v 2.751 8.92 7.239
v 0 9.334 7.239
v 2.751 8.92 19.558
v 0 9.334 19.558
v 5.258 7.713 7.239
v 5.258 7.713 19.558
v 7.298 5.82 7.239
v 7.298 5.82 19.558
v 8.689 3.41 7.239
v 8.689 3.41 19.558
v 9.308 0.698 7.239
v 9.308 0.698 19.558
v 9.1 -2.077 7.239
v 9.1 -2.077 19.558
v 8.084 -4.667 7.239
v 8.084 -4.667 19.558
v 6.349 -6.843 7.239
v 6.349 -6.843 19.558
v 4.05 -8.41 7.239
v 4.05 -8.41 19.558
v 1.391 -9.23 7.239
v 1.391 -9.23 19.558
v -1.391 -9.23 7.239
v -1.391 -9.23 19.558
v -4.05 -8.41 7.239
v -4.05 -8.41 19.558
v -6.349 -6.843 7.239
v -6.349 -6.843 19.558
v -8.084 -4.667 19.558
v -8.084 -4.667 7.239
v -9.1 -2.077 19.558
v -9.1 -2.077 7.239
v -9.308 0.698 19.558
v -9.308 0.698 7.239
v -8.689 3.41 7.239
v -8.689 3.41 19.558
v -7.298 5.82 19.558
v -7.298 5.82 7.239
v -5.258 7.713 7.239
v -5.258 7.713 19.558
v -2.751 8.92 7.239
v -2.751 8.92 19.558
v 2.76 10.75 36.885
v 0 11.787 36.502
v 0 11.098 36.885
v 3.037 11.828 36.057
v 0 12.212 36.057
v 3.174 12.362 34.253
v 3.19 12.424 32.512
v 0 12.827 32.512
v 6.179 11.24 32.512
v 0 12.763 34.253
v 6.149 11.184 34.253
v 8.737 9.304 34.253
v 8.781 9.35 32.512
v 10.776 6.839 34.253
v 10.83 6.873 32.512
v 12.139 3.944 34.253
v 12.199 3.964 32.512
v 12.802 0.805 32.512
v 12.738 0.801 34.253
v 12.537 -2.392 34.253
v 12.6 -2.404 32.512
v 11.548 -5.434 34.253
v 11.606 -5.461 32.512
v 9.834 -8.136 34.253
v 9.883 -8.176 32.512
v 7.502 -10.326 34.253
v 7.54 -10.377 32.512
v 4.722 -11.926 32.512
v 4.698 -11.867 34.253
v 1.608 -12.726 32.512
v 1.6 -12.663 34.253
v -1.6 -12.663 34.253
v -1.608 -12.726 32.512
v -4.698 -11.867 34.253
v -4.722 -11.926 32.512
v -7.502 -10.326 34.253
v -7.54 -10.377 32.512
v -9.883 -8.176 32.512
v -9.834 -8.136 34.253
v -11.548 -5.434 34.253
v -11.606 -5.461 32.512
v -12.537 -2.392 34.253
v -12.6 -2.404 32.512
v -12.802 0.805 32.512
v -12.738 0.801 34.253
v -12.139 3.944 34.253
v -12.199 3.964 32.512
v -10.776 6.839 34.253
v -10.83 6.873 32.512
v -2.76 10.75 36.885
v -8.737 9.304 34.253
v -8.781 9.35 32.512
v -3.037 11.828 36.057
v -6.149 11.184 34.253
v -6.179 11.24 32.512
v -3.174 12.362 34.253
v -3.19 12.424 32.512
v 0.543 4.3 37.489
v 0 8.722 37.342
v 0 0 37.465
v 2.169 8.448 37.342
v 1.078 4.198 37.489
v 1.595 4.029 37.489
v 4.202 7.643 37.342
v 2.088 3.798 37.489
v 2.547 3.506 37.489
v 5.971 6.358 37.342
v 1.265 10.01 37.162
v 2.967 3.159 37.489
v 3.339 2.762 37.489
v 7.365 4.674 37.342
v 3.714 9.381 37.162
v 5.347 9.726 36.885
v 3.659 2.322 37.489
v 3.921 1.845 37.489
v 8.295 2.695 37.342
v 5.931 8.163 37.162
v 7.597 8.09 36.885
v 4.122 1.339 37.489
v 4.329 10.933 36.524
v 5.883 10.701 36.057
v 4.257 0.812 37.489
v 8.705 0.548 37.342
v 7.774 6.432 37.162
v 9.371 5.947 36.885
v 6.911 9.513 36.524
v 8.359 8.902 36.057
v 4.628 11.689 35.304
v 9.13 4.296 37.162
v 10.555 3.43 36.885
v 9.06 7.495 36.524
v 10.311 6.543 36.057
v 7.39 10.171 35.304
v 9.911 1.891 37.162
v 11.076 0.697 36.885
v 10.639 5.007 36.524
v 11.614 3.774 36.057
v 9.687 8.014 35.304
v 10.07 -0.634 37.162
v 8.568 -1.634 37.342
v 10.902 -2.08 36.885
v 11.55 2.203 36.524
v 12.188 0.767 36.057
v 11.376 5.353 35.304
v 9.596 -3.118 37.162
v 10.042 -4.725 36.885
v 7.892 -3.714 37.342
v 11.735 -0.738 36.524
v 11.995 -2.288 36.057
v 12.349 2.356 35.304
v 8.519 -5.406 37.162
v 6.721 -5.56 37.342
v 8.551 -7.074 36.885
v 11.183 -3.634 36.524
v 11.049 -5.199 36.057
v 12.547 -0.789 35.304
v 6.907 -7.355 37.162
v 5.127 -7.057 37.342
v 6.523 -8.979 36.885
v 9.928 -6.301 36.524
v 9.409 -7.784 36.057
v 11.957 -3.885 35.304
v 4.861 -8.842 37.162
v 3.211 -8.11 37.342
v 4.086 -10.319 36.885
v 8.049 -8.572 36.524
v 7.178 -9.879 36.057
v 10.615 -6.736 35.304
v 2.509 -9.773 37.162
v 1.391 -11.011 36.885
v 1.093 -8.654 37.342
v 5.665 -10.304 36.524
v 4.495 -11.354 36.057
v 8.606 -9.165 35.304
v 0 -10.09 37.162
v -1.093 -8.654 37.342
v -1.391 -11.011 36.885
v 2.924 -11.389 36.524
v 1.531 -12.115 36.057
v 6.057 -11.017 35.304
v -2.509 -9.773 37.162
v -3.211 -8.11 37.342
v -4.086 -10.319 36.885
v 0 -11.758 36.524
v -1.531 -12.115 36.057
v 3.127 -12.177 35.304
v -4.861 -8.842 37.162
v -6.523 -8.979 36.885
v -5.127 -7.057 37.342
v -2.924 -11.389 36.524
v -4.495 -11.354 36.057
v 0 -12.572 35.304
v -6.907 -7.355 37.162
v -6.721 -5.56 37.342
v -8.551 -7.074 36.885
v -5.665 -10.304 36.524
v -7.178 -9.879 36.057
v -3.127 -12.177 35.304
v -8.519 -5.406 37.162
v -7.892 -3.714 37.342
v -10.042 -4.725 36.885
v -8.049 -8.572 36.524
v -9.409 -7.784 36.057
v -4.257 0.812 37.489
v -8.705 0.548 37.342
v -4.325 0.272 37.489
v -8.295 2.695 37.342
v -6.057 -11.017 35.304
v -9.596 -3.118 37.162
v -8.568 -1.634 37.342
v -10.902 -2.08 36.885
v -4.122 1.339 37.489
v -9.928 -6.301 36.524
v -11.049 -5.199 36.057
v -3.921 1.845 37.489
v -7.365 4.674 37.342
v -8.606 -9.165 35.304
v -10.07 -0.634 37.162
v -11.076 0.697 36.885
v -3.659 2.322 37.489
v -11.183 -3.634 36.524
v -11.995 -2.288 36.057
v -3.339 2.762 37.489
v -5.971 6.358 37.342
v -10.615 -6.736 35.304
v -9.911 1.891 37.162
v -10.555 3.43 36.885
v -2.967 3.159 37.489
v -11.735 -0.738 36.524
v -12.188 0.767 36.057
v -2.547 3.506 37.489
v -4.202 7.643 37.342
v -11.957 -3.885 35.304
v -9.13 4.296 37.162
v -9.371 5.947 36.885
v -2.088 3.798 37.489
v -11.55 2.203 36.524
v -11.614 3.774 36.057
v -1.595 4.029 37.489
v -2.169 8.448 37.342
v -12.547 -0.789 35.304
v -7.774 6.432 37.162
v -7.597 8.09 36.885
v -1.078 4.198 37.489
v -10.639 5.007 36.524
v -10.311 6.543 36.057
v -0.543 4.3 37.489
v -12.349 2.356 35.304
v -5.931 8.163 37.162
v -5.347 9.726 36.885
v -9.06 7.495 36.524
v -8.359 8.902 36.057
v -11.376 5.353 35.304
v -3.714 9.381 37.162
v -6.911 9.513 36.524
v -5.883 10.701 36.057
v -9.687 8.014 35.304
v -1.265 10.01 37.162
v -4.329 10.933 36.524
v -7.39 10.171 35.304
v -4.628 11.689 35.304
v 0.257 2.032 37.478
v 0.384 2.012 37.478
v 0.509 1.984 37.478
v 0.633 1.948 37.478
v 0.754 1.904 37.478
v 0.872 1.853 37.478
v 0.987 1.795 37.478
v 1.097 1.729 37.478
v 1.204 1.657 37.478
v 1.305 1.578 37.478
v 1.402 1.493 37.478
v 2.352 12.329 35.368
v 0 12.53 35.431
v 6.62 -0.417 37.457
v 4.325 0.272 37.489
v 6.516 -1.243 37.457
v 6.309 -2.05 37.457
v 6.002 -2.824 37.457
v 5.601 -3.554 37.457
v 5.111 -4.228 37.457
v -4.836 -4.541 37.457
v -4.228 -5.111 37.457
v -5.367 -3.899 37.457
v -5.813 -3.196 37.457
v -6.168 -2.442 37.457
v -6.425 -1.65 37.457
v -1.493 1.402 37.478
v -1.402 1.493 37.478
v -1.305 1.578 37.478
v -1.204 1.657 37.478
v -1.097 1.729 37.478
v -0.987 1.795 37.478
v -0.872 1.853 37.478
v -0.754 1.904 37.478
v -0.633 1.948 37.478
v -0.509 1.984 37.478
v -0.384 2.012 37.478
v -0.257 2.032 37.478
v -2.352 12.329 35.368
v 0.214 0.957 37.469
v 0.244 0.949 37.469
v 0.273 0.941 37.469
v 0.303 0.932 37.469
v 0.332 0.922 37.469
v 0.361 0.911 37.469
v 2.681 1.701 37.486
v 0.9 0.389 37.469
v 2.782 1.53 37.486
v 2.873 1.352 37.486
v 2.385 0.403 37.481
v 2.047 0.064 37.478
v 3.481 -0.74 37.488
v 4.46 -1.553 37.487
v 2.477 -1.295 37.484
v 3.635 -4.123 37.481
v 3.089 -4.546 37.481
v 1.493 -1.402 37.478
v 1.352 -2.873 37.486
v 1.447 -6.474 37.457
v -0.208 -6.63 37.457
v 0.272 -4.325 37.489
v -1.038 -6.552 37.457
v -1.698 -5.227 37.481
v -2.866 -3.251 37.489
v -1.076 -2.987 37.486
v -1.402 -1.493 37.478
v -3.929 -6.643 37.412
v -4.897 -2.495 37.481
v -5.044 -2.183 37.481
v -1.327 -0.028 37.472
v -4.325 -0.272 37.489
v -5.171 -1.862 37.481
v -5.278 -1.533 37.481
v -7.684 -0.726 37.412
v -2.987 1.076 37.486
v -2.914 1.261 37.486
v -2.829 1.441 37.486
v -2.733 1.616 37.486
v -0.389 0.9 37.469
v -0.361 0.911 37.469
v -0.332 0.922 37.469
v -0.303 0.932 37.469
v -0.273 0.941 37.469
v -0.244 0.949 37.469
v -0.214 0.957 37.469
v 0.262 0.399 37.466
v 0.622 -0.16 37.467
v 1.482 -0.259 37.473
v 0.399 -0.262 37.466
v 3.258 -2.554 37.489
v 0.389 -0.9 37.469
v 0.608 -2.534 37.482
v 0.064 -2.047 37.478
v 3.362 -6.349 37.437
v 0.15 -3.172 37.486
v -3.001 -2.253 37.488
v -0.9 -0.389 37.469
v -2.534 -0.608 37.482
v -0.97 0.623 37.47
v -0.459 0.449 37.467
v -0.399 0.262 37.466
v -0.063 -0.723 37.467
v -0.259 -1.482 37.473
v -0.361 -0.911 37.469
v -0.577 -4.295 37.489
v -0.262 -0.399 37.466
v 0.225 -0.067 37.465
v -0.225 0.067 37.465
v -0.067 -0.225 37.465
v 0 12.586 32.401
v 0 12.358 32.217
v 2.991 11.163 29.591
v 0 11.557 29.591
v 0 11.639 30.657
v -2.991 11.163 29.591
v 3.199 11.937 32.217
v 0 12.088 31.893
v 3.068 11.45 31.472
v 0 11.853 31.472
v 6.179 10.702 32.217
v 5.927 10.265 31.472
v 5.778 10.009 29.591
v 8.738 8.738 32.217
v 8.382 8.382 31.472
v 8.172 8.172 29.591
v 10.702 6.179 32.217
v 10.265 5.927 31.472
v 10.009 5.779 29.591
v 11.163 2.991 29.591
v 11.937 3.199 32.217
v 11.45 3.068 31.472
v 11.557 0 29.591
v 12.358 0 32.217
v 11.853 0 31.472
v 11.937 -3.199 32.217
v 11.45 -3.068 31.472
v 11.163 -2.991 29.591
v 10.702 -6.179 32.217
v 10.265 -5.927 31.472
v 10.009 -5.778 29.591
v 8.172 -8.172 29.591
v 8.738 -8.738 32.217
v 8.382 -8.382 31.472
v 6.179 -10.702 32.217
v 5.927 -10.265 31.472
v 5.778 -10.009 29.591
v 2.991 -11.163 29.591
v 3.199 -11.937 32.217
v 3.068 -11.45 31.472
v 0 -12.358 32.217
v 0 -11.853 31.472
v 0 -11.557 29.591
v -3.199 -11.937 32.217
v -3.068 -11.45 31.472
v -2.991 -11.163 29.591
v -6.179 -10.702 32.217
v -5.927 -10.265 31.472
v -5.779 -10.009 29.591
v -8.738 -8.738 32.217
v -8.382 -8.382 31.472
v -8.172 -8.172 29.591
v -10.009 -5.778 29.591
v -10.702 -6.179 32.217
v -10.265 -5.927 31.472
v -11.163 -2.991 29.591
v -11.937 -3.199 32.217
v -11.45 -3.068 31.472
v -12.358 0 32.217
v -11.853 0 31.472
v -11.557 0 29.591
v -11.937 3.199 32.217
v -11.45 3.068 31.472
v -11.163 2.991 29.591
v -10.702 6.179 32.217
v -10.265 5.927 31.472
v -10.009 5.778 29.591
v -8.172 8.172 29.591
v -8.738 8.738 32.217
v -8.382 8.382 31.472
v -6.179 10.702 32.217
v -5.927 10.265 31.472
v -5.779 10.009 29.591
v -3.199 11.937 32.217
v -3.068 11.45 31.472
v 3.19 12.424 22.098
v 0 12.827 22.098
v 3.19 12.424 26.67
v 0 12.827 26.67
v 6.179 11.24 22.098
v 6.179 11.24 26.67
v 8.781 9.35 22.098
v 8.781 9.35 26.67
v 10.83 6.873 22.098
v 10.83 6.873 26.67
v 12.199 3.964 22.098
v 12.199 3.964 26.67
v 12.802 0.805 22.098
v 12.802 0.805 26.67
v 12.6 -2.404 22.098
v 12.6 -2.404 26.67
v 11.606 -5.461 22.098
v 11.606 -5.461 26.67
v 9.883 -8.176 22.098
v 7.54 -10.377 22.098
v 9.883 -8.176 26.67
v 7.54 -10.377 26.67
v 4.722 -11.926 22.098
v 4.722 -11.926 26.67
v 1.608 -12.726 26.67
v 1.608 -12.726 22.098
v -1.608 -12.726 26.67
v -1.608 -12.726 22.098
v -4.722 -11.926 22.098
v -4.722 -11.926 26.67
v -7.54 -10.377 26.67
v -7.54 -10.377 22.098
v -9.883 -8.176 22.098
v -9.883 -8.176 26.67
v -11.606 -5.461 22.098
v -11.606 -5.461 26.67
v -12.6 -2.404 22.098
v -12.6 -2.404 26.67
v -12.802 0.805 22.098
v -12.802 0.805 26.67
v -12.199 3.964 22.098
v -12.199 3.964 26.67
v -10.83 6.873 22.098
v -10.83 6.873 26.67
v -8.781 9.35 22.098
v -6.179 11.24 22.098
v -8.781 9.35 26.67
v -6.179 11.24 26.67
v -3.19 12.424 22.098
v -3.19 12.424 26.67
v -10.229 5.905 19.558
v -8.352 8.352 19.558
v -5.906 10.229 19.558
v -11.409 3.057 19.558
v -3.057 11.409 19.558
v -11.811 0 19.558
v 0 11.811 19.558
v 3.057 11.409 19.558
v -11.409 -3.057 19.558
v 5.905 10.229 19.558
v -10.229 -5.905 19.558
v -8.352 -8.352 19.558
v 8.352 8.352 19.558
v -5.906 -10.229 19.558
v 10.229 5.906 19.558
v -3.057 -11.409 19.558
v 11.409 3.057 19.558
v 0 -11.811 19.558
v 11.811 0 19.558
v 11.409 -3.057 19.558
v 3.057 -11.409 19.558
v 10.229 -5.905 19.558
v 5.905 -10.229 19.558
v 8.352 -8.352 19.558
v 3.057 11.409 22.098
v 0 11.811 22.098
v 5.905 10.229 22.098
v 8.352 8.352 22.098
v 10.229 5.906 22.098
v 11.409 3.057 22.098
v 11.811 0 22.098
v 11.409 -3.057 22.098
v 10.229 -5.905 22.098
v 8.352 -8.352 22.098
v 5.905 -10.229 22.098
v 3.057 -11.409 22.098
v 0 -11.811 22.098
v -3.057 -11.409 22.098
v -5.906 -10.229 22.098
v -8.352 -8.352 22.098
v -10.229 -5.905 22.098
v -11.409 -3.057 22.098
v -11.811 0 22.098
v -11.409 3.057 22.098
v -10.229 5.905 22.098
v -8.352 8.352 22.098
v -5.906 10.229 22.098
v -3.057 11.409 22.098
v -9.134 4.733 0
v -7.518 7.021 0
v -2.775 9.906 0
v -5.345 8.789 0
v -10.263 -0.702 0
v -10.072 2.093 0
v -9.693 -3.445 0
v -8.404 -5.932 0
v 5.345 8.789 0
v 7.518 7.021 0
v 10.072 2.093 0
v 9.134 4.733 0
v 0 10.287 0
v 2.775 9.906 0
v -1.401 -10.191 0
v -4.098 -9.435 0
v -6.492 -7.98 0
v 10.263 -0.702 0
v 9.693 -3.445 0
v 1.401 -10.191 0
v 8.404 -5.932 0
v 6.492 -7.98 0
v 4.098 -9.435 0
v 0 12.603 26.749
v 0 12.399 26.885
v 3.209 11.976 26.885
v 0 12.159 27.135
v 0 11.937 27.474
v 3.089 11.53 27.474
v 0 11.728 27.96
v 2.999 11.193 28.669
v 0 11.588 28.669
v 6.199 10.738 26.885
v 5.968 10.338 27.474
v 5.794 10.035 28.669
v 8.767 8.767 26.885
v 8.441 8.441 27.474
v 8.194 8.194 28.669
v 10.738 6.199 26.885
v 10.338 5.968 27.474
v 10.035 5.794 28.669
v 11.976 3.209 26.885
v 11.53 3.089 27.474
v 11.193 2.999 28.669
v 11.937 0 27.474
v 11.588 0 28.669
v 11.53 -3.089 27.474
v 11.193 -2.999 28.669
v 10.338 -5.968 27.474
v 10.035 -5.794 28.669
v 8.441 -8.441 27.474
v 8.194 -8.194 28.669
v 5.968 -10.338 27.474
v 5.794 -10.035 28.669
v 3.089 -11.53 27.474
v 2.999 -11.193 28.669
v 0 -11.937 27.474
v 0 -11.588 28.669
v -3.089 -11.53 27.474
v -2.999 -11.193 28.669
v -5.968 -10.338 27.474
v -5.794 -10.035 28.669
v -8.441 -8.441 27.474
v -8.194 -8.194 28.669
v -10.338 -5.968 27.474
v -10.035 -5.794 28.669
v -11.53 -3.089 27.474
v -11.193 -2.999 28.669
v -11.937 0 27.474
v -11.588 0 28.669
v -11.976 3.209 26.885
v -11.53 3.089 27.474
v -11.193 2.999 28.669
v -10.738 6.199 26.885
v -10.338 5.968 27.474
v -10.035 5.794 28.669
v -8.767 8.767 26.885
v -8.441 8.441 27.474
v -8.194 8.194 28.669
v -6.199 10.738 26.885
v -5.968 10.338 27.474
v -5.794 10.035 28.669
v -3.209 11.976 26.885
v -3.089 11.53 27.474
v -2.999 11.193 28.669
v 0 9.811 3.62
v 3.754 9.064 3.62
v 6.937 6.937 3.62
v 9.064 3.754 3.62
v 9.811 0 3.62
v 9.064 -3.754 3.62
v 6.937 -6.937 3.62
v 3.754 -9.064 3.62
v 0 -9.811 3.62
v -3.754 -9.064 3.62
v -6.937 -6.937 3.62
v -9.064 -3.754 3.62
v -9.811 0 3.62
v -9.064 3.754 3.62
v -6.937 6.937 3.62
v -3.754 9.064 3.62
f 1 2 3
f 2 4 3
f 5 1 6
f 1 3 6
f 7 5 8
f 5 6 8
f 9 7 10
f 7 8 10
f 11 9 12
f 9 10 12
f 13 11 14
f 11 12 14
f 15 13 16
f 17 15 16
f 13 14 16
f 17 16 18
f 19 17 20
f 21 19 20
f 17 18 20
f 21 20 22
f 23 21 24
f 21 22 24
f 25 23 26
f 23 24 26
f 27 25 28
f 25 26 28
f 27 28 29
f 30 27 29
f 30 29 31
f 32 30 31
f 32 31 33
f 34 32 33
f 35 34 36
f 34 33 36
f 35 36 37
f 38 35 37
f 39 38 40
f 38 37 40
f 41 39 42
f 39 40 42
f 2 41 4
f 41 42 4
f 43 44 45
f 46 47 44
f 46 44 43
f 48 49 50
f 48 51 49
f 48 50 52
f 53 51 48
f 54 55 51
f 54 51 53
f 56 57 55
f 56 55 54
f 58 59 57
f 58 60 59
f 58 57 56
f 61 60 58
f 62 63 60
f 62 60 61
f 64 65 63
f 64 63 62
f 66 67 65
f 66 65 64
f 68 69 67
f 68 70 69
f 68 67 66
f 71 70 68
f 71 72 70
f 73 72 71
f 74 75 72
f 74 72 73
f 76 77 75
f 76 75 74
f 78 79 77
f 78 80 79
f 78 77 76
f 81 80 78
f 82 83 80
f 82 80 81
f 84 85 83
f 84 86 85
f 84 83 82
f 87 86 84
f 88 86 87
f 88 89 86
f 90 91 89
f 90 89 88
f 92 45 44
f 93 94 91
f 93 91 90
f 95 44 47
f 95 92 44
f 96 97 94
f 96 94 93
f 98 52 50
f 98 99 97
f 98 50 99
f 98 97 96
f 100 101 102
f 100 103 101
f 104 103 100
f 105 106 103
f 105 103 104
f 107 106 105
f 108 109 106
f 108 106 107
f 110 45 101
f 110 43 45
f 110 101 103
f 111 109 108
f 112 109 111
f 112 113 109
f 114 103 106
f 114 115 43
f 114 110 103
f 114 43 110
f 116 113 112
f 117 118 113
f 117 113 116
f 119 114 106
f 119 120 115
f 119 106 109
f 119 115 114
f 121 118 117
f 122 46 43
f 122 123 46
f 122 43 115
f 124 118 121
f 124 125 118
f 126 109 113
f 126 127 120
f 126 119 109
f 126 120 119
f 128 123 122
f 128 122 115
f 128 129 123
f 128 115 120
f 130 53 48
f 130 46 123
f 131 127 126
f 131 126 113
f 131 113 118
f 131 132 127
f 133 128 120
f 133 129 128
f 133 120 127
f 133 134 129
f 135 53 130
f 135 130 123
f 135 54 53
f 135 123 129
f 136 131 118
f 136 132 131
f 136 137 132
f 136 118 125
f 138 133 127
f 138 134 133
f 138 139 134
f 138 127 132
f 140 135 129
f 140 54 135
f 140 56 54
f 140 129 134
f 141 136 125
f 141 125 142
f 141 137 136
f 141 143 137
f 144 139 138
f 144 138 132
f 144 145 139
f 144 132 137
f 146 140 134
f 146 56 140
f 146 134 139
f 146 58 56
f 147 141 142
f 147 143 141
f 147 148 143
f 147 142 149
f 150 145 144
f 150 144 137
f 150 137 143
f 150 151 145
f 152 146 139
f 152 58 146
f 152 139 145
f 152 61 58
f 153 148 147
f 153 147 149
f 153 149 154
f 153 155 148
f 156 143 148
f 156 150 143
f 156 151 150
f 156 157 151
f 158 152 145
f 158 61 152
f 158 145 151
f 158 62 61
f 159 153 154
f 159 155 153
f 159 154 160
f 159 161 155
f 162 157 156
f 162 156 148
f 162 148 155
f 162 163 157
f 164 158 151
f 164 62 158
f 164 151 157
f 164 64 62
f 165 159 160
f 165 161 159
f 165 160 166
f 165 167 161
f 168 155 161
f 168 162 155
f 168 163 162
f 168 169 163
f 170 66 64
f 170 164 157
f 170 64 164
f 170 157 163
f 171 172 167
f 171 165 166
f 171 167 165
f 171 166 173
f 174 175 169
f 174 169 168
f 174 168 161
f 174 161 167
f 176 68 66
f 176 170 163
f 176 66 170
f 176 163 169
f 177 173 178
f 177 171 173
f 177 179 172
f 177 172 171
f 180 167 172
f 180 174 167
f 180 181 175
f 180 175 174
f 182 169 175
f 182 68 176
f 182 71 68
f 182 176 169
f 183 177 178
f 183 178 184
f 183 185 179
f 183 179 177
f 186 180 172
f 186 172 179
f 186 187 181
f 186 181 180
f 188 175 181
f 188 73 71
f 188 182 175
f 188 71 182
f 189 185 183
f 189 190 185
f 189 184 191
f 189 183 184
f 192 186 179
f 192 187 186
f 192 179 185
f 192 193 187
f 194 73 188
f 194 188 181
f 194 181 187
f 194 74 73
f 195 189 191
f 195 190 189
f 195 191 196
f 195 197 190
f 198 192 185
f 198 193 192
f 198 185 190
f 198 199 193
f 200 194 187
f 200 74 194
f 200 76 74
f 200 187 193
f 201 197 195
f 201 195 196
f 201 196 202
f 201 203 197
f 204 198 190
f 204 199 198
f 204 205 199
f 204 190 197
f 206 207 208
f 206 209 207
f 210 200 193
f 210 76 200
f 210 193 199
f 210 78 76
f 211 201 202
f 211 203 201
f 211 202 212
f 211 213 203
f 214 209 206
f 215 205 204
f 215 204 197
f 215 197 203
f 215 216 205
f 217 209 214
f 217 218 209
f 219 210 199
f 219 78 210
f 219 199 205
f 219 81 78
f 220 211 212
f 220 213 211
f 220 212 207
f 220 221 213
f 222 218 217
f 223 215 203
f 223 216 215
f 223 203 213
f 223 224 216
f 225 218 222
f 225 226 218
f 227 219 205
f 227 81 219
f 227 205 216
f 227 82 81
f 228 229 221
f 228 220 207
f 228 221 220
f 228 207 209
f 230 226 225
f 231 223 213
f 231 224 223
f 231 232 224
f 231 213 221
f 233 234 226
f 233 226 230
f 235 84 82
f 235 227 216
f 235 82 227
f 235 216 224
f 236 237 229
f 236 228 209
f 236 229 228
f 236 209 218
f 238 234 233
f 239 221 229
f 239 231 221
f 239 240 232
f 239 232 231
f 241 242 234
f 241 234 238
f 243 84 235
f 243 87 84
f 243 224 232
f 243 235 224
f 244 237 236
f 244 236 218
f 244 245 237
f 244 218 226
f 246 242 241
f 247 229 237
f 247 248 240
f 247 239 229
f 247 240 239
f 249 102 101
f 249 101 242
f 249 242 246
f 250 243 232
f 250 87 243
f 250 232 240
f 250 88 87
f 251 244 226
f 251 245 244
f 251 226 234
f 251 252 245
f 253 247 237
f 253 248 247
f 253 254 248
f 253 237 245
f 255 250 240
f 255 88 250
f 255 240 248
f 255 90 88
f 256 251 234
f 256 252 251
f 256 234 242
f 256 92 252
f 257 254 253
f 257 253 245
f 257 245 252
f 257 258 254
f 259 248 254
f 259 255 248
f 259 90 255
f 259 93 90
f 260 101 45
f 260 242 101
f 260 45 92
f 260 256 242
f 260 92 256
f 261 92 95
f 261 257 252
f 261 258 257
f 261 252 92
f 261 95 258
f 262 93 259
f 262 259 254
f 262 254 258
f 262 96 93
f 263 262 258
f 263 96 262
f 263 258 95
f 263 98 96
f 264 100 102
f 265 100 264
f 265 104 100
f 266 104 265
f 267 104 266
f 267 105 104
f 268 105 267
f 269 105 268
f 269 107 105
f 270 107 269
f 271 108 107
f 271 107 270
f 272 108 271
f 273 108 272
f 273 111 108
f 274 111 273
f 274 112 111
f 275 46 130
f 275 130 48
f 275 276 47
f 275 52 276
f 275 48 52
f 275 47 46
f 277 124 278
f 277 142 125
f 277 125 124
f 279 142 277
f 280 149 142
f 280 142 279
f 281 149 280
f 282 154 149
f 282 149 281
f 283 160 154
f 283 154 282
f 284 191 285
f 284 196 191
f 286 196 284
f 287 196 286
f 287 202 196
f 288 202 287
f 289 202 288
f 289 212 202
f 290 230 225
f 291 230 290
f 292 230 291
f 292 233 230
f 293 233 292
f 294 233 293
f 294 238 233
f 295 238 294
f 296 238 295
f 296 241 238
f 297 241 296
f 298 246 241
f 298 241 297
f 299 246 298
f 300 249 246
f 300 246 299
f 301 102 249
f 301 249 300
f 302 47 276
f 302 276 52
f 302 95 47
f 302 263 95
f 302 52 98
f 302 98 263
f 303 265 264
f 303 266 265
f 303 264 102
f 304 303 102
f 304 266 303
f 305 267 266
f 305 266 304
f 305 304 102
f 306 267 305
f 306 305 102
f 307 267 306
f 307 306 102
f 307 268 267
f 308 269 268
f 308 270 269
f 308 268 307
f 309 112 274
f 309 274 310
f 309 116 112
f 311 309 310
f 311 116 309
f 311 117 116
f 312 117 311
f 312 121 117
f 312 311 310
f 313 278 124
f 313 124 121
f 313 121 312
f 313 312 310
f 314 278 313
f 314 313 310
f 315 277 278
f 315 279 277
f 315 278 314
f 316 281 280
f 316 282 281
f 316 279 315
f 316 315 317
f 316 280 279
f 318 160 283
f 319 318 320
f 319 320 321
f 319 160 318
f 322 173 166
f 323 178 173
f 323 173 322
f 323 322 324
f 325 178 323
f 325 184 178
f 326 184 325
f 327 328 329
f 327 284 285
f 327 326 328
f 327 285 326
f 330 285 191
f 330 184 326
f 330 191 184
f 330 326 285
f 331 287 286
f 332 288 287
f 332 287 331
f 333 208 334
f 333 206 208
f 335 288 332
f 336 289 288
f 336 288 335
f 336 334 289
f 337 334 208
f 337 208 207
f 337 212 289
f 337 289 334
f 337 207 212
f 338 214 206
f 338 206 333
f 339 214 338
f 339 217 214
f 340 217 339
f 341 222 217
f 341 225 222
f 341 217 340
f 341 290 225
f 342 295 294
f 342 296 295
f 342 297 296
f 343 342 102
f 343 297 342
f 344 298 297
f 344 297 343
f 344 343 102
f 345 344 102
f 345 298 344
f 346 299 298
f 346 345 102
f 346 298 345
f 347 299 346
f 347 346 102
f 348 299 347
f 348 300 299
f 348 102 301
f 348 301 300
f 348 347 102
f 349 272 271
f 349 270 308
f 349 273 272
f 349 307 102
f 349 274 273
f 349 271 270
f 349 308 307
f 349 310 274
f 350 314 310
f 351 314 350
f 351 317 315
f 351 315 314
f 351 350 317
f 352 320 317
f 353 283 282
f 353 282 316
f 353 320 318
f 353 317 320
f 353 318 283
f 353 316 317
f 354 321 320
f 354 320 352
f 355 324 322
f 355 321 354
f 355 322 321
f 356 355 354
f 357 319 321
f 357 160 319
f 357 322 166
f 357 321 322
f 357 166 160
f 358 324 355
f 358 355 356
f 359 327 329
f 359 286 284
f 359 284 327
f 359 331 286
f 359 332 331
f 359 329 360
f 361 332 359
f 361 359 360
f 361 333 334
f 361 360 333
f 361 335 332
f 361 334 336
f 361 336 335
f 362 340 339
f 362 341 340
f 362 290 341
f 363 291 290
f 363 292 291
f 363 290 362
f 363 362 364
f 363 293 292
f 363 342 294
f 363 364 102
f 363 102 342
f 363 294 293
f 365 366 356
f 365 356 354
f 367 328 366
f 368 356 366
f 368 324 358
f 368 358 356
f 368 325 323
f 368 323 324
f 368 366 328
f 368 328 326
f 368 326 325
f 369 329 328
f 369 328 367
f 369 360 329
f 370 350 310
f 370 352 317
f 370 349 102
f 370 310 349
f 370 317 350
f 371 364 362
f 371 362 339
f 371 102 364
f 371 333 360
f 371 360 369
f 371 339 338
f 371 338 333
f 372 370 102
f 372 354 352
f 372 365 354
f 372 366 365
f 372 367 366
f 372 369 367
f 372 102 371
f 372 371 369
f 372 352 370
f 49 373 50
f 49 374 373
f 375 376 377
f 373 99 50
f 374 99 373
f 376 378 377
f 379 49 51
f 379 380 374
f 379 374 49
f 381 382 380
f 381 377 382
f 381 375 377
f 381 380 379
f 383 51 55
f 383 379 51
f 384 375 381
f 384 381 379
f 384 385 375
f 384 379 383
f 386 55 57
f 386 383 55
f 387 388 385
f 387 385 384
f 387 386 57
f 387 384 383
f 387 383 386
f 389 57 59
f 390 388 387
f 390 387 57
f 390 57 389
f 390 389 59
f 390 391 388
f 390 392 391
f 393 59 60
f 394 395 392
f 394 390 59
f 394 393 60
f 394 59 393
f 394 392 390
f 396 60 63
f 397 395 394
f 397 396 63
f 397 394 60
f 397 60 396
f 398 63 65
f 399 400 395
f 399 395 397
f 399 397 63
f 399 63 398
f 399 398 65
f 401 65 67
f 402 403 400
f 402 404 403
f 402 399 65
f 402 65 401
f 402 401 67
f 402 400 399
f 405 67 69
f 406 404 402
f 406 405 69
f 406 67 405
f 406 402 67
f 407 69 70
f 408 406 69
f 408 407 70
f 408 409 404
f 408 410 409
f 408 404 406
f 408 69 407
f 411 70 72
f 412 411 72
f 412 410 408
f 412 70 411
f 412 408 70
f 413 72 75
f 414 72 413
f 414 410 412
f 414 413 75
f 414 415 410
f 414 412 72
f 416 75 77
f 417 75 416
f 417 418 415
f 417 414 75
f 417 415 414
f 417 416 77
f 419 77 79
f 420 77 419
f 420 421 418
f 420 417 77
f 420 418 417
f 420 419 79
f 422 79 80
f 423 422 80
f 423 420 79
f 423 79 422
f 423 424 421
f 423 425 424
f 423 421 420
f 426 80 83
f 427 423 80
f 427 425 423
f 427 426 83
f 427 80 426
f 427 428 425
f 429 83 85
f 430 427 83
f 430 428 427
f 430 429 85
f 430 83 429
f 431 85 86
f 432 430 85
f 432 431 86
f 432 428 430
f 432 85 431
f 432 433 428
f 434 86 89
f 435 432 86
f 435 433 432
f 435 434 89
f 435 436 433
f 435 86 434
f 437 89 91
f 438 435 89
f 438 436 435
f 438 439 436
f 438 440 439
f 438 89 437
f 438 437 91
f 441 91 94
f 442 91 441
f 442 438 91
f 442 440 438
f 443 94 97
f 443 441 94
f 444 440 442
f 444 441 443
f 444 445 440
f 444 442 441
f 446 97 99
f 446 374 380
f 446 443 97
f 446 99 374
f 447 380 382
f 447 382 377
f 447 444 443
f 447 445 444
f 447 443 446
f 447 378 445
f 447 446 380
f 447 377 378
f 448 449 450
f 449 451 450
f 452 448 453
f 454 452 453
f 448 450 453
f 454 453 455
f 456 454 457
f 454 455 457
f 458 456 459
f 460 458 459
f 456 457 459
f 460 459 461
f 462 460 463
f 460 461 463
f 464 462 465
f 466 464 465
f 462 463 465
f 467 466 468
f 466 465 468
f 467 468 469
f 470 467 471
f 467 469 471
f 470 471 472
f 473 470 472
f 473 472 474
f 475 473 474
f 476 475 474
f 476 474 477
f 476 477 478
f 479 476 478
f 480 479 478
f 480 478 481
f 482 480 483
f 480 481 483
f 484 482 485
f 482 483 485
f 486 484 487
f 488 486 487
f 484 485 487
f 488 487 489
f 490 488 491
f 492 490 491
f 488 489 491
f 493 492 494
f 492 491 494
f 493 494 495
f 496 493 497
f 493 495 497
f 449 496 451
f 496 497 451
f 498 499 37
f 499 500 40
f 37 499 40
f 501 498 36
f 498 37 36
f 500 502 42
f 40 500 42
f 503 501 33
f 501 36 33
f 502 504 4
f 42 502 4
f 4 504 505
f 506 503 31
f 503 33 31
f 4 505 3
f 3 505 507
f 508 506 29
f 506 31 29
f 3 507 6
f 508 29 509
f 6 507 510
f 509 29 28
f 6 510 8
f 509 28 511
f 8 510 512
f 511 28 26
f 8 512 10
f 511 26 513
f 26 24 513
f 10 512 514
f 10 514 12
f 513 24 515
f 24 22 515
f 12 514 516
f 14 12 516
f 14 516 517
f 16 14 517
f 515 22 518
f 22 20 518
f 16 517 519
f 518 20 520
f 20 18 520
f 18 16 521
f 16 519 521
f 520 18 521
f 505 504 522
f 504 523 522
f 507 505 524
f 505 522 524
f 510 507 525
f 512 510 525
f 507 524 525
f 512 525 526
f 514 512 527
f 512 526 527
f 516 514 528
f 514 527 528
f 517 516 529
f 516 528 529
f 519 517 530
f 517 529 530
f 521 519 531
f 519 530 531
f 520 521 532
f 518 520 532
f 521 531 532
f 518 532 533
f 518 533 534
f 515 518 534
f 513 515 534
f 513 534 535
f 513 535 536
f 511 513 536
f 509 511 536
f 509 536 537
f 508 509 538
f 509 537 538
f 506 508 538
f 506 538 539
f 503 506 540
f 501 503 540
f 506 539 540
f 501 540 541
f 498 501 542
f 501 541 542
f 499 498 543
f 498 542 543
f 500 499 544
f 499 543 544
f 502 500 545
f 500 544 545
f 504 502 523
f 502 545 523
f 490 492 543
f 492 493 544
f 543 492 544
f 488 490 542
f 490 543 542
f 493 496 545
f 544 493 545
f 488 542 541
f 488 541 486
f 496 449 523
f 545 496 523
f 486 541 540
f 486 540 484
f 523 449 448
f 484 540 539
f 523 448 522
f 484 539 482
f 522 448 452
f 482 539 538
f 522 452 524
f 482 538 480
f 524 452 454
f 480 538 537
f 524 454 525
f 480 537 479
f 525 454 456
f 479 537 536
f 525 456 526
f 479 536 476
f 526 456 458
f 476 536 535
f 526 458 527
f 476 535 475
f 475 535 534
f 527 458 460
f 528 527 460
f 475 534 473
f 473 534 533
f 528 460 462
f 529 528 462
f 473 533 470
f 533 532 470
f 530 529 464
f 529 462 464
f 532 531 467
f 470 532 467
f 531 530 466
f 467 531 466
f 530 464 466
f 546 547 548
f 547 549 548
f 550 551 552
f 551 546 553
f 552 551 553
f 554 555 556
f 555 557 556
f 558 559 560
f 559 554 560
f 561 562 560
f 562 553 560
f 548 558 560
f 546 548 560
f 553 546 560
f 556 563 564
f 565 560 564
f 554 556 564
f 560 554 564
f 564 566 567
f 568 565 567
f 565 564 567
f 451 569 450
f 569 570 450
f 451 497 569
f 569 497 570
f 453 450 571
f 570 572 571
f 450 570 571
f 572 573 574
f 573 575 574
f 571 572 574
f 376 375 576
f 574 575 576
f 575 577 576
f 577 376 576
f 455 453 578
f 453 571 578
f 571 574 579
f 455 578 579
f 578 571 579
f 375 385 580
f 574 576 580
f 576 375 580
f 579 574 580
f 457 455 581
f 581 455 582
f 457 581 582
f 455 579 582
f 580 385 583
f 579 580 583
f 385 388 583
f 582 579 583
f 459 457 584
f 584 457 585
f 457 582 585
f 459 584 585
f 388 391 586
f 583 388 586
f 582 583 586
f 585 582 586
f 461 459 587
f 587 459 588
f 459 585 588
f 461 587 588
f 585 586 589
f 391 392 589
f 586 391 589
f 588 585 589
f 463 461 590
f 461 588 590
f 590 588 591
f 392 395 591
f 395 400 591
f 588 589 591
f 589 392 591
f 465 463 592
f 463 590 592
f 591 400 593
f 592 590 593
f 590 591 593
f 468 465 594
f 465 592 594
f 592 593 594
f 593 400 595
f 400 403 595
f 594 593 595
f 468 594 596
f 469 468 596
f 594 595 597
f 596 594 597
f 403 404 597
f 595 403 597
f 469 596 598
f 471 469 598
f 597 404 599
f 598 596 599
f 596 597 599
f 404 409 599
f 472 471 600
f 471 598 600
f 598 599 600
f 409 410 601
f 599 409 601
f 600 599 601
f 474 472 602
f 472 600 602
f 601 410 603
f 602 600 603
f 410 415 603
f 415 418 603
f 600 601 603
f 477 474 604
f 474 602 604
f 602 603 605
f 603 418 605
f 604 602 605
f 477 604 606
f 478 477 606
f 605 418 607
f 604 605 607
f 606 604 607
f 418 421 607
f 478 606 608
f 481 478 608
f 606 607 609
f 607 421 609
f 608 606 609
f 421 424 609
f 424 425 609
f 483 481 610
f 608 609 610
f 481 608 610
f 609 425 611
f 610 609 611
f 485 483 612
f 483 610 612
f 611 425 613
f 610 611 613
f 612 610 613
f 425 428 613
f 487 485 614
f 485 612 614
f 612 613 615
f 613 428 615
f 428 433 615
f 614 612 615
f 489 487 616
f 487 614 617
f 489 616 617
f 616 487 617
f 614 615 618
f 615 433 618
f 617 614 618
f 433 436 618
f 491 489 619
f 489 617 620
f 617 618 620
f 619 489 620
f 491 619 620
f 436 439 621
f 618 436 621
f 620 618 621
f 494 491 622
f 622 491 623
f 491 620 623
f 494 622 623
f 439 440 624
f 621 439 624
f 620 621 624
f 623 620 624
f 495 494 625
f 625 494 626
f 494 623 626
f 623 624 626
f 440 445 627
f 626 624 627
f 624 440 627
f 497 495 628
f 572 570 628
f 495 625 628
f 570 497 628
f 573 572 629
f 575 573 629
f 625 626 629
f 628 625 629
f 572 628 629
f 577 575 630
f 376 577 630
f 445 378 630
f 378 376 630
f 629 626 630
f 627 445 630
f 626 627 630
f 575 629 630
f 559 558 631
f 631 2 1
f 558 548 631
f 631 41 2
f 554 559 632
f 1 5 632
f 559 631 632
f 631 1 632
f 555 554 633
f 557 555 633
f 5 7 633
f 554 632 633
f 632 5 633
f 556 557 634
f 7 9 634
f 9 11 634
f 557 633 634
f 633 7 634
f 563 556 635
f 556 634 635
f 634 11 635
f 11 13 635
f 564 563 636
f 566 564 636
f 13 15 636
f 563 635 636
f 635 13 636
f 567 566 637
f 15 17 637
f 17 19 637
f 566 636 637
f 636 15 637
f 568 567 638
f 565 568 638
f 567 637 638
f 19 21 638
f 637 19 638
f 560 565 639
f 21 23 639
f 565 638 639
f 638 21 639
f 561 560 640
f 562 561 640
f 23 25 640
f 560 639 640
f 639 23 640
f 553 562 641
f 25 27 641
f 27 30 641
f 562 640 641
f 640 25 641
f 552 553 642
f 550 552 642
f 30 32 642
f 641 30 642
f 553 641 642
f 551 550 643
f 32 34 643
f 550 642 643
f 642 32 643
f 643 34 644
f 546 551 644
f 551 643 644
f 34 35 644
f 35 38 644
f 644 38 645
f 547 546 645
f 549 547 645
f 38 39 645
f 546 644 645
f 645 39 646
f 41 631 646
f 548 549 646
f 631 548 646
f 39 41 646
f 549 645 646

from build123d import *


with BuildPart() as f1:
    # F0 (on Right) → F1 (revolve)
    with BuildSketch(Plane.YZ):
        with BuildLine():
            Line((0, 37.465), (0, 0))
            Line((0, 0), (10.287, 0))
            Line((10.287, 0), (9.3345, 7.239))
            Line((9.3345, 7.239), (9.3345, 19.558))
            Line((9.3345, 19.558), (11.811, 19.558))
            Line((11.811, 19.558), (11.811, 22.098))
            Line((11.811, 22.098), (12.827, 22.098))
            Line((12.827, 22.098), (12.827, 26.67))
            add(Edge.make_bspline(
                [(12.827, 26.67), (12.4081355943, 26.7518746483), (11.668341413, 27.6965440026), (11.5477926188, 28.6778707178), (11.557, 29.591)],
                knots=[0, 0, 0, 0, 0.4500062565, 1, 1, 1, 1], degree=3))
            add(Edge.make_bspline(
                [(12.827, 32.512), (12.4568852809, 32.4087269434), (11.6627350099, 31.4718039327), (11.603105506, 30.474725655), (11.557, 29.591)],
                knots=[0, 0, 0, 0, 0.4510036491, 1, 1, 1, 1], degree=3))
            add(Edge.make_bspline(
                [(0, 37.465), (2.9634942766, 37.465), (10.0295003068, 37.6879569755), (12.5919958228, 36.131462946), (12.827, 34.3799444409), (12.827, 32.512)],
                knots=[0, 0, 0, 0, 0.4794803062, 0.715586112, 1, 1, 1, 1], degree=3))
        make_face()
    revolve(axis=Axis((0, 0, 18.7325), (0, 0, -1)))


solid = f1.part
